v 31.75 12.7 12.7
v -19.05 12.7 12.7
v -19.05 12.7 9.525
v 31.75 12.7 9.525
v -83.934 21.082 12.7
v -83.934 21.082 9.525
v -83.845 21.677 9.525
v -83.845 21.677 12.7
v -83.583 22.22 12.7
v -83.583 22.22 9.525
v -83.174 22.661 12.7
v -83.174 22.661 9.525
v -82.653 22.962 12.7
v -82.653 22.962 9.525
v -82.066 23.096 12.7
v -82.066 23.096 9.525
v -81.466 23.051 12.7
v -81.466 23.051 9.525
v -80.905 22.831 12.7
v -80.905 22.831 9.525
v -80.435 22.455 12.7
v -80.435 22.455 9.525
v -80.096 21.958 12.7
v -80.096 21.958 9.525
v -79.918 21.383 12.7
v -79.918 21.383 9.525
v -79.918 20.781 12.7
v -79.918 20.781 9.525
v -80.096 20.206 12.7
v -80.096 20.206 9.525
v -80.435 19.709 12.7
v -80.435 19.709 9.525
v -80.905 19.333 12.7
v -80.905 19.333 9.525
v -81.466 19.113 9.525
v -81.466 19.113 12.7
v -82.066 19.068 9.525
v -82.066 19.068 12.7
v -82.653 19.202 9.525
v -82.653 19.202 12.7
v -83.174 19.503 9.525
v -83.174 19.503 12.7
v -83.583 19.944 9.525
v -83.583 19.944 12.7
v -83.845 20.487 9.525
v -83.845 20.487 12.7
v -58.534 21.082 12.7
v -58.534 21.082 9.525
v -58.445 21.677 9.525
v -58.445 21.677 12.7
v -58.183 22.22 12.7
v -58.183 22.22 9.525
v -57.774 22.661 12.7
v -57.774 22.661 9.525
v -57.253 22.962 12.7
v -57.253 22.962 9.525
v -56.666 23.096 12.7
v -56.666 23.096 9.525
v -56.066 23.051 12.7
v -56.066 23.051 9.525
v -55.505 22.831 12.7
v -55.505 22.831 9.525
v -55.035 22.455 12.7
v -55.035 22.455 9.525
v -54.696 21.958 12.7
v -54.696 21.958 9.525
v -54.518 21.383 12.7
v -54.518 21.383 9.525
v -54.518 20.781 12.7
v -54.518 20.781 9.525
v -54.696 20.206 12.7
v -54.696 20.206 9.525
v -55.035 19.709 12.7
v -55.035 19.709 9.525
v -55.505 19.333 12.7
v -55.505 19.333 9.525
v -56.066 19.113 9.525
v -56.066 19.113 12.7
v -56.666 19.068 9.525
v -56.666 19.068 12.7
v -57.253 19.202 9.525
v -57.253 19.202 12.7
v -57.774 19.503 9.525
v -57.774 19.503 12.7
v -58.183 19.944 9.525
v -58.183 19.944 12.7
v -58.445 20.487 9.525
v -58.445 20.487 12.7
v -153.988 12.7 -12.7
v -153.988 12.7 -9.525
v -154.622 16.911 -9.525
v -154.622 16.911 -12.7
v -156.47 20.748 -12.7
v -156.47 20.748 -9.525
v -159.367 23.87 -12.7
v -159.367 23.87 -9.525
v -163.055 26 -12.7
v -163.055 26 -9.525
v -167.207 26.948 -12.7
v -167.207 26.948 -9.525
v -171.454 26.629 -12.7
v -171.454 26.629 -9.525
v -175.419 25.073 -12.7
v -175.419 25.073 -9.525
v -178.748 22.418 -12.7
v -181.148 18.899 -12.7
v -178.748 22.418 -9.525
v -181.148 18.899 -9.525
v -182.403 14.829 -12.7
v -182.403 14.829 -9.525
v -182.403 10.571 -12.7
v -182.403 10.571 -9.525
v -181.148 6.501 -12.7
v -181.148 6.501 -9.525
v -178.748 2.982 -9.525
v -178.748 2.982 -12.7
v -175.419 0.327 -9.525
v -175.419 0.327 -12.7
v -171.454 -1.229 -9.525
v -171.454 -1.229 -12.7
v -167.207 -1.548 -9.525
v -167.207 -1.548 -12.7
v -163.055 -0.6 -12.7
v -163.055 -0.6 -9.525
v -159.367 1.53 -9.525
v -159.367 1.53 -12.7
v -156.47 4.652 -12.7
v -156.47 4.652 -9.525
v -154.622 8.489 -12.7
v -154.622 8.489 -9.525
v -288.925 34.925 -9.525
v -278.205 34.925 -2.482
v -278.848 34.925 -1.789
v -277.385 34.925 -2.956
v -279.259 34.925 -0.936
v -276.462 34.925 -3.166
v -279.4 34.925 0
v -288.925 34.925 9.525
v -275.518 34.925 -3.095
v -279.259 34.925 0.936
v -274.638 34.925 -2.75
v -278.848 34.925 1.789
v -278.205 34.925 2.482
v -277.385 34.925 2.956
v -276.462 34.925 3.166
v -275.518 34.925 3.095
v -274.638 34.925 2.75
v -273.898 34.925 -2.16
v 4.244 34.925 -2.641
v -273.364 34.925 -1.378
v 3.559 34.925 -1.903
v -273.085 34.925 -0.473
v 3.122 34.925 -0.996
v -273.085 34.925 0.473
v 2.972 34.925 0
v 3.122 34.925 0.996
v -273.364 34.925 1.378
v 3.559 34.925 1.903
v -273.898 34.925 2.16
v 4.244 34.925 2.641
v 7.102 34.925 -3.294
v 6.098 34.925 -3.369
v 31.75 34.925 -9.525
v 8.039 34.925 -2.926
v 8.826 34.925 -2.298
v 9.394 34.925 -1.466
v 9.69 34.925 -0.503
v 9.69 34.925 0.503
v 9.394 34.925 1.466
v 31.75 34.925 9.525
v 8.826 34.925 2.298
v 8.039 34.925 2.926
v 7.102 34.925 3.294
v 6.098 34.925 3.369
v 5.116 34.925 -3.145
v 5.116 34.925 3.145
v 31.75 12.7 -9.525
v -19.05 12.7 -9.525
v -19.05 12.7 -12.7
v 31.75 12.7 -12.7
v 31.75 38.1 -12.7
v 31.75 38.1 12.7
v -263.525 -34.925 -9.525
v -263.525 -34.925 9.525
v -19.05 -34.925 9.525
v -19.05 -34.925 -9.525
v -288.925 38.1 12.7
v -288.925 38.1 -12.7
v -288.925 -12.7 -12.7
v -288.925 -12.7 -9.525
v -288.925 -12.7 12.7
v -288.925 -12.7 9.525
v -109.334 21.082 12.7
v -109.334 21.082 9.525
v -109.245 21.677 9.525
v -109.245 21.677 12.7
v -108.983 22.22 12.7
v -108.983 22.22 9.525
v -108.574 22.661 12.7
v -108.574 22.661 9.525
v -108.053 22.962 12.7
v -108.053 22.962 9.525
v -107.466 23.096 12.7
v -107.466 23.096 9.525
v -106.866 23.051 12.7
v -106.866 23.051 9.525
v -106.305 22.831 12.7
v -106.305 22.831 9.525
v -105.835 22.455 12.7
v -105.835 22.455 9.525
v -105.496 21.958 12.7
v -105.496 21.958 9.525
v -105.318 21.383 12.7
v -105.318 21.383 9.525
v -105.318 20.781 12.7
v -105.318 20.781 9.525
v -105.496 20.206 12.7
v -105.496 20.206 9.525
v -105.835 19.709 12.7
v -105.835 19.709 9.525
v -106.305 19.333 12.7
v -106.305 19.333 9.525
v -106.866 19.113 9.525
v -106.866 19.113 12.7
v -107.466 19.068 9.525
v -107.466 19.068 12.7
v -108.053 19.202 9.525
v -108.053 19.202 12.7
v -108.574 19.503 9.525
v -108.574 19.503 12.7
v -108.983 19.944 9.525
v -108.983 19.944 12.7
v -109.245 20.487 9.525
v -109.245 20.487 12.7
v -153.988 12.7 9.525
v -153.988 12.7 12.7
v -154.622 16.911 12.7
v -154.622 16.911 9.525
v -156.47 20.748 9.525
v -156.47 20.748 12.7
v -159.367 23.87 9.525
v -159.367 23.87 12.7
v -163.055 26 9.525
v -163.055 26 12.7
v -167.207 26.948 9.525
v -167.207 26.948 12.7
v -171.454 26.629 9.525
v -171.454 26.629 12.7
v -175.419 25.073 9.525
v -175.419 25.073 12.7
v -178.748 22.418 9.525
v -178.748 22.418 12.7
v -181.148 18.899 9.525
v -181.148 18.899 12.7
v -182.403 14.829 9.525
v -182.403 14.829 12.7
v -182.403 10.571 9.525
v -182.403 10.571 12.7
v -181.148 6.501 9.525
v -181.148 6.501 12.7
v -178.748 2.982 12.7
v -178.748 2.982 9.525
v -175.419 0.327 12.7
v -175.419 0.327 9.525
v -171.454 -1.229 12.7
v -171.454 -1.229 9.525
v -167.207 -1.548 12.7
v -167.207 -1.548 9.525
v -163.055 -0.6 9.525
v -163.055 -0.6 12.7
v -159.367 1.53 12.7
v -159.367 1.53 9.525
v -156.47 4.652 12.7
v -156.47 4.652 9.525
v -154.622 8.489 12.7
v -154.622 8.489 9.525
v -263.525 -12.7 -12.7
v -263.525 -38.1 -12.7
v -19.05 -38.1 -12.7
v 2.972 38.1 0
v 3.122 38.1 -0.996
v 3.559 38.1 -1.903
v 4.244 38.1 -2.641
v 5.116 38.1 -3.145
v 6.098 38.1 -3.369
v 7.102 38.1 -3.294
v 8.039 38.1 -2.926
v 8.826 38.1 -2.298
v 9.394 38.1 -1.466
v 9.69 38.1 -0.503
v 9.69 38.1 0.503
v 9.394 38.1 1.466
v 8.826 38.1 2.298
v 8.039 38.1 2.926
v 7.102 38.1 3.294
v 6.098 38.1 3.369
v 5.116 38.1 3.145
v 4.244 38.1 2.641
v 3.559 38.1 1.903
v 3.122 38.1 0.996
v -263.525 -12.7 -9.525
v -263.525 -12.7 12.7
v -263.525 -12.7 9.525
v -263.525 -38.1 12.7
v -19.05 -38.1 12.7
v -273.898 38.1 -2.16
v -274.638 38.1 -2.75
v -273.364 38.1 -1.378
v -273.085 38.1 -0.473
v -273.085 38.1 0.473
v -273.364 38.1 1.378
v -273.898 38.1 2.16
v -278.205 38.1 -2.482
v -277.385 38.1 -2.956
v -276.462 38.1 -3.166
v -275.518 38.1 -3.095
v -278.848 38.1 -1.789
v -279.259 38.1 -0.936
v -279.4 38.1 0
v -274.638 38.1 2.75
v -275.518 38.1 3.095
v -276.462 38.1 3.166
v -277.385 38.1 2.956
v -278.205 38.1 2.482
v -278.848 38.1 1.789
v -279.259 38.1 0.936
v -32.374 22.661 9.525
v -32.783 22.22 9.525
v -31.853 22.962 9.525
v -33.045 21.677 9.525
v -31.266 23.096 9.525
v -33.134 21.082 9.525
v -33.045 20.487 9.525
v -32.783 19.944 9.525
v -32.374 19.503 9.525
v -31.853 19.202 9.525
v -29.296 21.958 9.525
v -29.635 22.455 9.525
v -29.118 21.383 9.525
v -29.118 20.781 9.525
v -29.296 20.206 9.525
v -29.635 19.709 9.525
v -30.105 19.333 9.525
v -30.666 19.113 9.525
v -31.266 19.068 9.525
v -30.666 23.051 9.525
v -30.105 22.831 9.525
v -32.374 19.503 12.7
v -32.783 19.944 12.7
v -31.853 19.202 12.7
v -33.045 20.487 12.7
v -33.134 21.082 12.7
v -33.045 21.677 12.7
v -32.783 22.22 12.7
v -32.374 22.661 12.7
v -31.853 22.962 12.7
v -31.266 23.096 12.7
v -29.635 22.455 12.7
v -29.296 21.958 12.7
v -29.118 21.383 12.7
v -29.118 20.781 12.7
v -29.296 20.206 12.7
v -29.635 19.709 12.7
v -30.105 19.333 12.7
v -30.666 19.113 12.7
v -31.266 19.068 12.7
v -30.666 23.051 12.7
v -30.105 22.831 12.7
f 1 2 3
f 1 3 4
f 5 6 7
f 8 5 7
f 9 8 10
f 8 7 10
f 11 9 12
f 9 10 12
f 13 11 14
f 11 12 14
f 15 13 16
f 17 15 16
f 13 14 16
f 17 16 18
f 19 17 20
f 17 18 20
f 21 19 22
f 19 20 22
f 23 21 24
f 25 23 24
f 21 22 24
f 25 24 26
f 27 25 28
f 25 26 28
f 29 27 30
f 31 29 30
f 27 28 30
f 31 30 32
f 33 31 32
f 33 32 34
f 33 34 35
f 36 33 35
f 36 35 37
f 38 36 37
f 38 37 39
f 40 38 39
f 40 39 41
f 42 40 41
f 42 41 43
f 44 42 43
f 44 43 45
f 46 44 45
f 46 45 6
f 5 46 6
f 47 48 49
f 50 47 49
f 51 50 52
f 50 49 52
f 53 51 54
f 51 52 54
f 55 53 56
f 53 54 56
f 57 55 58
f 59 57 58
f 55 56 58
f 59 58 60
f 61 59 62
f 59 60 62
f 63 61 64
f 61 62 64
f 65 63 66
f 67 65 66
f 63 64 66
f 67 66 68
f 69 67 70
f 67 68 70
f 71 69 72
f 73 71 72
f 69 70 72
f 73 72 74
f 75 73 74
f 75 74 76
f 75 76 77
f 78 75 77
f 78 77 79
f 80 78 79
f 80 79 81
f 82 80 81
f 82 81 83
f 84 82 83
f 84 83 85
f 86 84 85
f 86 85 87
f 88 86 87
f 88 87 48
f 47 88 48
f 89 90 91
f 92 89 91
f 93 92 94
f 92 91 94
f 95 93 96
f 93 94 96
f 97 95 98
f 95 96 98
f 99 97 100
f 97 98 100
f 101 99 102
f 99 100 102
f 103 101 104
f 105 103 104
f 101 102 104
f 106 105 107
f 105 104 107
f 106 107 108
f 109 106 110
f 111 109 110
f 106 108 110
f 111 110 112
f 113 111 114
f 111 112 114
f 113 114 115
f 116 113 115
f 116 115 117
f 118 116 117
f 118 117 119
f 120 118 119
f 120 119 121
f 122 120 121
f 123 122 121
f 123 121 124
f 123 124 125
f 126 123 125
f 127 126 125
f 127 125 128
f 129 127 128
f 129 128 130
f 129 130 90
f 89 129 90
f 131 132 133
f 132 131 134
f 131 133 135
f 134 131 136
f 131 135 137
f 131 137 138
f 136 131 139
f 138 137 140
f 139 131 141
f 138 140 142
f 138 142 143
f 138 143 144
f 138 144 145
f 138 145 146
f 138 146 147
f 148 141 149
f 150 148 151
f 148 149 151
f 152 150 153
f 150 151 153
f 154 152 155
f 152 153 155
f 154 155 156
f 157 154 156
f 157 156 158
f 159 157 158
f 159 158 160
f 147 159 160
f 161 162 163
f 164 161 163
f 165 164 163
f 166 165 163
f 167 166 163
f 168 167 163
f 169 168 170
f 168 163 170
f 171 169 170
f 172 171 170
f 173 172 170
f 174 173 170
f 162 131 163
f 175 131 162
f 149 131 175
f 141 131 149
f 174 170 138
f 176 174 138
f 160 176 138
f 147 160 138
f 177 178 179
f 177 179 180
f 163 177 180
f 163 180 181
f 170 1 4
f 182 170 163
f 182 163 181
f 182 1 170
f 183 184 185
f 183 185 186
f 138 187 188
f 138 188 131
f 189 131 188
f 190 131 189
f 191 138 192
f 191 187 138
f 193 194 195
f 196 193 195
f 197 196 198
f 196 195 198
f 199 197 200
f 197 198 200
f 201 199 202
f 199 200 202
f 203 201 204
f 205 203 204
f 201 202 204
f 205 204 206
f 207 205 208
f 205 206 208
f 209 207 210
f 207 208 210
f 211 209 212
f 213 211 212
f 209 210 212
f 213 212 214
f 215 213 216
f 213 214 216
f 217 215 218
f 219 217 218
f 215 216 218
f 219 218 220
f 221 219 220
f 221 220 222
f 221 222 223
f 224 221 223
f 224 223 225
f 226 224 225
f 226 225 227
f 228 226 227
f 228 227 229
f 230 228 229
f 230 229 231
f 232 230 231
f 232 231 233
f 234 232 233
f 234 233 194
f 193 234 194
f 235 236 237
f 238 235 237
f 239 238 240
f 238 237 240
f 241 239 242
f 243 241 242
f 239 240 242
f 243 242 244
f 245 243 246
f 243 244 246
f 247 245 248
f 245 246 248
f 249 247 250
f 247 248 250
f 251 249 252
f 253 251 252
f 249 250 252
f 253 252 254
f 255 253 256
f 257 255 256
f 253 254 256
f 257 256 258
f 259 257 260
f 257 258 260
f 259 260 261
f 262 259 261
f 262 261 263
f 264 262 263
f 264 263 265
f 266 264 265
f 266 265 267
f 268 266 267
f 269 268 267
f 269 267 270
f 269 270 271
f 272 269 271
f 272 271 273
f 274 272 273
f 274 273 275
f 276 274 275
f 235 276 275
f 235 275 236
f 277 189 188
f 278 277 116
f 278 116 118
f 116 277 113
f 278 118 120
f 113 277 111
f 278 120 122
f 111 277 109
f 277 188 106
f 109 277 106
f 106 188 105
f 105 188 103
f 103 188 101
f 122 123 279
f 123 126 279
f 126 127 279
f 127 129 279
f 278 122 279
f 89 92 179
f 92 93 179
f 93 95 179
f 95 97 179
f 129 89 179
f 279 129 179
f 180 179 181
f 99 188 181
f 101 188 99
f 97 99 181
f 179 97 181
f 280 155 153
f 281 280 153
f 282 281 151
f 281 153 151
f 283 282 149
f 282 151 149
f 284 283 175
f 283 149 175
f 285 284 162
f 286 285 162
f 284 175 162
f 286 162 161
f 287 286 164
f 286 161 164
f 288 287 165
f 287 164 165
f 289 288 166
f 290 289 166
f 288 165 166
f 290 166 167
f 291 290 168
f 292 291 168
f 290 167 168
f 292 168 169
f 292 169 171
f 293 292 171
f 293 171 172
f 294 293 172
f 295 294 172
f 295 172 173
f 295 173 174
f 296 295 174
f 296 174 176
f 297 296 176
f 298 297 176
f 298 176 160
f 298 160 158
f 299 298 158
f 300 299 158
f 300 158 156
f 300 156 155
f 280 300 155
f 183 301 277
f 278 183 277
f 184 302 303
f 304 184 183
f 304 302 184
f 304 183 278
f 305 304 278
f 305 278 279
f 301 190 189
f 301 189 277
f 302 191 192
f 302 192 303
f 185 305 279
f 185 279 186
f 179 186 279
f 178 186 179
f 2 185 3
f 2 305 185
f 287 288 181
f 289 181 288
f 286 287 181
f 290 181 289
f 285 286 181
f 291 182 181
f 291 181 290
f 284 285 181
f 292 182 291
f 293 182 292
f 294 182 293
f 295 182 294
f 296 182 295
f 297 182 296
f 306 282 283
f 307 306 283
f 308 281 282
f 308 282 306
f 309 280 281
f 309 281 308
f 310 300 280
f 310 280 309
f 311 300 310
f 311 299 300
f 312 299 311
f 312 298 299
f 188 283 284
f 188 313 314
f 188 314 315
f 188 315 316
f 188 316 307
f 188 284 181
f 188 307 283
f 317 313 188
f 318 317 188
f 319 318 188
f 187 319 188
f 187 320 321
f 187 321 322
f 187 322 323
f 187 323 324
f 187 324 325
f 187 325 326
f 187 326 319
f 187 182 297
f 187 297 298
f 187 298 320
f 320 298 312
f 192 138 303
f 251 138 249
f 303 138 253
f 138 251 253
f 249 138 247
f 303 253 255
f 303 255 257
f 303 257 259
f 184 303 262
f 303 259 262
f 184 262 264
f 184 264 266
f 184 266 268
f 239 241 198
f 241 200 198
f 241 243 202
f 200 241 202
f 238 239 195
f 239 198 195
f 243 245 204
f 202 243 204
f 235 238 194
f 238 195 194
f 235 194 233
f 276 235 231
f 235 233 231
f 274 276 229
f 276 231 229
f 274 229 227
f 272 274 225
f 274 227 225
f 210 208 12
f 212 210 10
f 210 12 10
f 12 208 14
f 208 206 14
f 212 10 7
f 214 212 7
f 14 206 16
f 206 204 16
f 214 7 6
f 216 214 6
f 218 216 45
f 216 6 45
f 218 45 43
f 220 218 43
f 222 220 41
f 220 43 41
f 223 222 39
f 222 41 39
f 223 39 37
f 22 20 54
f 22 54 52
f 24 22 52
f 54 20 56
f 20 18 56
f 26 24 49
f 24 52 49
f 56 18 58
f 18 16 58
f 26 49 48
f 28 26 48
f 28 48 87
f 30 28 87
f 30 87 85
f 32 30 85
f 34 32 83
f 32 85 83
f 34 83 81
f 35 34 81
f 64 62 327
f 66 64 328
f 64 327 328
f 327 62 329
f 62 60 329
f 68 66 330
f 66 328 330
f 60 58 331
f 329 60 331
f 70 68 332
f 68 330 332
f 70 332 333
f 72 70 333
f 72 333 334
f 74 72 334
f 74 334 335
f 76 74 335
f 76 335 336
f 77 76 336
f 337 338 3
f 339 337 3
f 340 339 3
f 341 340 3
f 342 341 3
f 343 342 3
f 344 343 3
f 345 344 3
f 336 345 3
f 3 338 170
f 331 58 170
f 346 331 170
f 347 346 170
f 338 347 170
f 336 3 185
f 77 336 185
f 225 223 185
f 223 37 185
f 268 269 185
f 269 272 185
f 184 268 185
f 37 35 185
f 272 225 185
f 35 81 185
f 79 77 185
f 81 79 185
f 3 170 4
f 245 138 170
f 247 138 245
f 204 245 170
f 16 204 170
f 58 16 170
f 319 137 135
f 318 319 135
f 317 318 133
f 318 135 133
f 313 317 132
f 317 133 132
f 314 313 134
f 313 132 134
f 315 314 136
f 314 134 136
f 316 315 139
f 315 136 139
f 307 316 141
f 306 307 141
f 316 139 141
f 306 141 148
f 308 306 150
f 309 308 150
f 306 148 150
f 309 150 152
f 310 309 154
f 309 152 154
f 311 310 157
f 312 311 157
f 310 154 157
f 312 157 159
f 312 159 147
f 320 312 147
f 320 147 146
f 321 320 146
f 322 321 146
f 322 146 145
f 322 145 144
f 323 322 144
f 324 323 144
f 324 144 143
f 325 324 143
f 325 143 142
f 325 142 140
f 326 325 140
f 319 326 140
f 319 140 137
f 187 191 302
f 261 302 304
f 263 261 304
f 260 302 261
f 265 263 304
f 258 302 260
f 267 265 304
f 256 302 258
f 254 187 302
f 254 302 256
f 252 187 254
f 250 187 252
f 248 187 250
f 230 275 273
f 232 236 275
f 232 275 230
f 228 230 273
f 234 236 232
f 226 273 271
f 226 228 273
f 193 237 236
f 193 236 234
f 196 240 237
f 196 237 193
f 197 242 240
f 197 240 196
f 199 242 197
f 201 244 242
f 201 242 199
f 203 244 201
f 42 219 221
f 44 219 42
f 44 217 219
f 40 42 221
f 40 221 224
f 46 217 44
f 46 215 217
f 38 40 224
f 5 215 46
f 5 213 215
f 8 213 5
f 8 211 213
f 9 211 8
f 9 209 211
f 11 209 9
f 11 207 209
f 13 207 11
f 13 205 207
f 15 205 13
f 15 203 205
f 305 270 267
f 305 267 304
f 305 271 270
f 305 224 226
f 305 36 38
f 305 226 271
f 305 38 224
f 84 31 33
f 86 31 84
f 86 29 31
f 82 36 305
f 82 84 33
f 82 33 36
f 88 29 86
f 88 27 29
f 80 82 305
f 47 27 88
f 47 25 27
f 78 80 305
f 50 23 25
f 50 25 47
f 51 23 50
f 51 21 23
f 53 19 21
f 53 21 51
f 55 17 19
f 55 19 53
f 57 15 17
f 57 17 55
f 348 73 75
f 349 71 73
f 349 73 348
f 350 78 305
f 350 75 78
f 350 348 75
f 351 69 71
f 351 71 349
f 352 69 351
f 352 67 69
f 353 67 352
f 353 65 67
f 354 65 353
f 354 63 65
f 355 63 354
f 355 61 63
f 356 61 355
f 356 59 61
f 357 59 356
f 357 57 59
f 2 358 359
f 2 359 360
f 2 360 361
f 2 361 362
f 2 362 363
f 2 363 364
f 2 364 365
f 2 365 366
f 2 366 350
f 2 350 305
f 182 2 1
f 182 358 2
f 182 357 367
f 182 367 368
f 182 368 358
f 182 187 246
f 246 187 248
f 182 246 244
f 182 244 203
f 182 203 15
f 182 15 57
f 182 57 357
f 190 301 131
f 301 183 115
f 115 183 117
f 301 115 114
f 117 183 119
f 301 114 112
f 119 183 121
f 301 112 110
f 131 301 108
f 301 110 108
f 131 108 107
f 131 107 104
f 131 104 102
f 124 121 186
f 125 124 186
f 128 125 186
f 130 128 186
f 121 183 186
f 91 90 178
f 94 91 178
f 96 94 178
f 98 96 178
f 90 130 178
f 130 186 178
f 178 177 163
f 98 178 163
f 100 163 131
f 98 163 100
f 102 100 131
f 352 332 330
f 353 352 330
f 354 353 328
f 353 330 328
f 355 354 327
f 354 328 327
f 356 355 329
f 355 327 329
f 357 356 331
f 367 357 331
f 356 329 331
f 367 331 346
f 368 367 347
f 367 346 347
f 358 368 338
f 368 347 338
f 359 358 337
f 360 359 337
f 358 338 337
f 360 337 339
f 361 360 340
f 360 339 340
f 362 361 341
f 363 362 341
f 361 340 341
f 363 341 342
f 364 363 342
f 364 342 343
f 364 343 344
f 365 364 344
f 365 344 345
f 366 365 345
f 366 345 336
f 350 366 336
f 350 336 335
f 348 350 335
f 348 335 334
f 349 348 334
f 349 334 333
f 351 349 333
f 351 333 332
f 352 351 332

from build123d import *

# Parameters (mm, degrees)
BOSS_EXTRUDE1_DEPTH         = 12.7
F_1_4_0_25_DIAMETER_HOLE1_D = 6.35
CUT_EXTRUDE1_DEPTH          = 580.243923145
SKETCH8_R                   = 14.2875
CUT_EXTRUDE2_DEPTH          = 293.531067795
F_10_32_TAPPED_HOLE1_D      = 4.0386
F_10_32_TAPPED_HOLE1_DEPTH  = 13.716
F_10_32_TAPPED_HOLE1_TIP    = 1.213317848
SKETCH11_W                  = 257.175
SKETCH11_H                  = 76.2
CUT_EXTRUDE3_DEPTH          = 293.531067795
SKETCH13_W                  = 50.8
SKETCH13_H                  = 50.8
CUT_EXTRUDE5_DEPTH          = 293.531067795
F_1_4_CLEARANCE_HOLE1_D     = 6.7564


with BuildPart() as part:
    # Sketch1 → Boss-Extrude1 (new, symmetric)
    with BuildSketch(Plane.XY):
        Polygon((-288.925, 38.1), (-288.925, -12.7), (-263.525, -12.7), (-263.525, -38.1), (263.525, -38.1), (263.525, -12.7), (288.925, -12.7), (288.925, 38.1), align=None)
    extrude(amount=BOSS_EXTRUDE1_DEPTH, both=True)

    # 1/4 (0.25) Diameter Hole1 (through all)
    with Locations(Plane(origin=(0, 38.1, 0), x_dir=(1, 0, 0), z_dir=(0, 1, 0))):
        with Locations((-276.225, 0), (276.225, 0)):
            Hole(F_1_4_0_25_DIAMETER_HOLE1_D / 2)

    # Sketch5 → Cut-Extrude1 (cut, through all)
    with BuildSketch(Plane(origin=(288.925, 0, 0), x_dir=(0, 0, -1), z_dir=(1, 0, 0))):
        Polygon((9.525, -12.7), (9.525, 34.925), (-9.525, 34.925), (-9.525, -12.7), (-9.525, -34.925), (9.525, -34.925), align=None)
    extrude(amount=-CUT_EXTRUDE1_DEPTH, mode=Mode.SUBTRACT)

    # Sketch8 → Cut-Extrude2 (cut, through all)
    with BuildSketch(Plane.XY.offset(12.7)):
        with Locations((-168.275, 12.7)):
            Circle(SKETCH8_R)
        with Locations((168.275, 12.7)):
            Circle(SKETCH8_R)
    extrude(amount=-CUT_EXTRUDE2_DEPTH, mode=Mode.SUBTRACT)

    # #10-32 Tapped Hole1
    with Locations(Plane.XY.offset(12.7)):
        with Locations((-107.315, 21.082), (-81.915, 21.082), (-56.515, 21.082), (-31.115, 21.082)):
            Hole(F_10_32_TAPPED_HOLE1_D / 2, depth=F_10_32_TAPPED_HOLE1_DEPTH)
            with Locations((0, 0, -(F_10_32_TAPPED_HOLE1_DEPTH + F_10_32_TAPPED_HOLE1_TIP / 2))):  # 118° drill point
                Cone(0, F_10_32_TAPPED_HOLE1_D / 2, F_10_32_TAPPED_HOLE1_TIP, mode=Mode.SUBTRACT)

    # Sketch11 → Cut-Extrude3 (cut, through all)
    with BuildSketch(Plane.XY.offset(12.7)):
        with Locations((160.3375, 0)):
            Rectangle(SKETCH11_W, SKETCH11_H)
    extrude(amount=-CUT_EXTRUDE3_DEPTH, mode=Mode.SUBTRACT)

    # Sketch13 → Cut-Extrude5 (cut, through all)
    with BuildSketch(Plane.XY.offset(12.7)):
        with Locations((6.35, -12.7)):
            Rectangle(SKETCH13_W, SKETCH13_H)
    extrude(amount=-CUT_EXTRUDE5_DEPTH, mode=Mode.SUBTRACT)

    # 1/4 Clearance Hole1 (through all)
    with Locations(Plane(origin=(0, 38.1, 0), x_dir=(1, 0, 0), z_dir=(0, 1, 0))):
        with Locations((6.35, 0)):
            Hole(F_1_4_CLEARANCE_HOLE1_D / 2)


solid = part.part
